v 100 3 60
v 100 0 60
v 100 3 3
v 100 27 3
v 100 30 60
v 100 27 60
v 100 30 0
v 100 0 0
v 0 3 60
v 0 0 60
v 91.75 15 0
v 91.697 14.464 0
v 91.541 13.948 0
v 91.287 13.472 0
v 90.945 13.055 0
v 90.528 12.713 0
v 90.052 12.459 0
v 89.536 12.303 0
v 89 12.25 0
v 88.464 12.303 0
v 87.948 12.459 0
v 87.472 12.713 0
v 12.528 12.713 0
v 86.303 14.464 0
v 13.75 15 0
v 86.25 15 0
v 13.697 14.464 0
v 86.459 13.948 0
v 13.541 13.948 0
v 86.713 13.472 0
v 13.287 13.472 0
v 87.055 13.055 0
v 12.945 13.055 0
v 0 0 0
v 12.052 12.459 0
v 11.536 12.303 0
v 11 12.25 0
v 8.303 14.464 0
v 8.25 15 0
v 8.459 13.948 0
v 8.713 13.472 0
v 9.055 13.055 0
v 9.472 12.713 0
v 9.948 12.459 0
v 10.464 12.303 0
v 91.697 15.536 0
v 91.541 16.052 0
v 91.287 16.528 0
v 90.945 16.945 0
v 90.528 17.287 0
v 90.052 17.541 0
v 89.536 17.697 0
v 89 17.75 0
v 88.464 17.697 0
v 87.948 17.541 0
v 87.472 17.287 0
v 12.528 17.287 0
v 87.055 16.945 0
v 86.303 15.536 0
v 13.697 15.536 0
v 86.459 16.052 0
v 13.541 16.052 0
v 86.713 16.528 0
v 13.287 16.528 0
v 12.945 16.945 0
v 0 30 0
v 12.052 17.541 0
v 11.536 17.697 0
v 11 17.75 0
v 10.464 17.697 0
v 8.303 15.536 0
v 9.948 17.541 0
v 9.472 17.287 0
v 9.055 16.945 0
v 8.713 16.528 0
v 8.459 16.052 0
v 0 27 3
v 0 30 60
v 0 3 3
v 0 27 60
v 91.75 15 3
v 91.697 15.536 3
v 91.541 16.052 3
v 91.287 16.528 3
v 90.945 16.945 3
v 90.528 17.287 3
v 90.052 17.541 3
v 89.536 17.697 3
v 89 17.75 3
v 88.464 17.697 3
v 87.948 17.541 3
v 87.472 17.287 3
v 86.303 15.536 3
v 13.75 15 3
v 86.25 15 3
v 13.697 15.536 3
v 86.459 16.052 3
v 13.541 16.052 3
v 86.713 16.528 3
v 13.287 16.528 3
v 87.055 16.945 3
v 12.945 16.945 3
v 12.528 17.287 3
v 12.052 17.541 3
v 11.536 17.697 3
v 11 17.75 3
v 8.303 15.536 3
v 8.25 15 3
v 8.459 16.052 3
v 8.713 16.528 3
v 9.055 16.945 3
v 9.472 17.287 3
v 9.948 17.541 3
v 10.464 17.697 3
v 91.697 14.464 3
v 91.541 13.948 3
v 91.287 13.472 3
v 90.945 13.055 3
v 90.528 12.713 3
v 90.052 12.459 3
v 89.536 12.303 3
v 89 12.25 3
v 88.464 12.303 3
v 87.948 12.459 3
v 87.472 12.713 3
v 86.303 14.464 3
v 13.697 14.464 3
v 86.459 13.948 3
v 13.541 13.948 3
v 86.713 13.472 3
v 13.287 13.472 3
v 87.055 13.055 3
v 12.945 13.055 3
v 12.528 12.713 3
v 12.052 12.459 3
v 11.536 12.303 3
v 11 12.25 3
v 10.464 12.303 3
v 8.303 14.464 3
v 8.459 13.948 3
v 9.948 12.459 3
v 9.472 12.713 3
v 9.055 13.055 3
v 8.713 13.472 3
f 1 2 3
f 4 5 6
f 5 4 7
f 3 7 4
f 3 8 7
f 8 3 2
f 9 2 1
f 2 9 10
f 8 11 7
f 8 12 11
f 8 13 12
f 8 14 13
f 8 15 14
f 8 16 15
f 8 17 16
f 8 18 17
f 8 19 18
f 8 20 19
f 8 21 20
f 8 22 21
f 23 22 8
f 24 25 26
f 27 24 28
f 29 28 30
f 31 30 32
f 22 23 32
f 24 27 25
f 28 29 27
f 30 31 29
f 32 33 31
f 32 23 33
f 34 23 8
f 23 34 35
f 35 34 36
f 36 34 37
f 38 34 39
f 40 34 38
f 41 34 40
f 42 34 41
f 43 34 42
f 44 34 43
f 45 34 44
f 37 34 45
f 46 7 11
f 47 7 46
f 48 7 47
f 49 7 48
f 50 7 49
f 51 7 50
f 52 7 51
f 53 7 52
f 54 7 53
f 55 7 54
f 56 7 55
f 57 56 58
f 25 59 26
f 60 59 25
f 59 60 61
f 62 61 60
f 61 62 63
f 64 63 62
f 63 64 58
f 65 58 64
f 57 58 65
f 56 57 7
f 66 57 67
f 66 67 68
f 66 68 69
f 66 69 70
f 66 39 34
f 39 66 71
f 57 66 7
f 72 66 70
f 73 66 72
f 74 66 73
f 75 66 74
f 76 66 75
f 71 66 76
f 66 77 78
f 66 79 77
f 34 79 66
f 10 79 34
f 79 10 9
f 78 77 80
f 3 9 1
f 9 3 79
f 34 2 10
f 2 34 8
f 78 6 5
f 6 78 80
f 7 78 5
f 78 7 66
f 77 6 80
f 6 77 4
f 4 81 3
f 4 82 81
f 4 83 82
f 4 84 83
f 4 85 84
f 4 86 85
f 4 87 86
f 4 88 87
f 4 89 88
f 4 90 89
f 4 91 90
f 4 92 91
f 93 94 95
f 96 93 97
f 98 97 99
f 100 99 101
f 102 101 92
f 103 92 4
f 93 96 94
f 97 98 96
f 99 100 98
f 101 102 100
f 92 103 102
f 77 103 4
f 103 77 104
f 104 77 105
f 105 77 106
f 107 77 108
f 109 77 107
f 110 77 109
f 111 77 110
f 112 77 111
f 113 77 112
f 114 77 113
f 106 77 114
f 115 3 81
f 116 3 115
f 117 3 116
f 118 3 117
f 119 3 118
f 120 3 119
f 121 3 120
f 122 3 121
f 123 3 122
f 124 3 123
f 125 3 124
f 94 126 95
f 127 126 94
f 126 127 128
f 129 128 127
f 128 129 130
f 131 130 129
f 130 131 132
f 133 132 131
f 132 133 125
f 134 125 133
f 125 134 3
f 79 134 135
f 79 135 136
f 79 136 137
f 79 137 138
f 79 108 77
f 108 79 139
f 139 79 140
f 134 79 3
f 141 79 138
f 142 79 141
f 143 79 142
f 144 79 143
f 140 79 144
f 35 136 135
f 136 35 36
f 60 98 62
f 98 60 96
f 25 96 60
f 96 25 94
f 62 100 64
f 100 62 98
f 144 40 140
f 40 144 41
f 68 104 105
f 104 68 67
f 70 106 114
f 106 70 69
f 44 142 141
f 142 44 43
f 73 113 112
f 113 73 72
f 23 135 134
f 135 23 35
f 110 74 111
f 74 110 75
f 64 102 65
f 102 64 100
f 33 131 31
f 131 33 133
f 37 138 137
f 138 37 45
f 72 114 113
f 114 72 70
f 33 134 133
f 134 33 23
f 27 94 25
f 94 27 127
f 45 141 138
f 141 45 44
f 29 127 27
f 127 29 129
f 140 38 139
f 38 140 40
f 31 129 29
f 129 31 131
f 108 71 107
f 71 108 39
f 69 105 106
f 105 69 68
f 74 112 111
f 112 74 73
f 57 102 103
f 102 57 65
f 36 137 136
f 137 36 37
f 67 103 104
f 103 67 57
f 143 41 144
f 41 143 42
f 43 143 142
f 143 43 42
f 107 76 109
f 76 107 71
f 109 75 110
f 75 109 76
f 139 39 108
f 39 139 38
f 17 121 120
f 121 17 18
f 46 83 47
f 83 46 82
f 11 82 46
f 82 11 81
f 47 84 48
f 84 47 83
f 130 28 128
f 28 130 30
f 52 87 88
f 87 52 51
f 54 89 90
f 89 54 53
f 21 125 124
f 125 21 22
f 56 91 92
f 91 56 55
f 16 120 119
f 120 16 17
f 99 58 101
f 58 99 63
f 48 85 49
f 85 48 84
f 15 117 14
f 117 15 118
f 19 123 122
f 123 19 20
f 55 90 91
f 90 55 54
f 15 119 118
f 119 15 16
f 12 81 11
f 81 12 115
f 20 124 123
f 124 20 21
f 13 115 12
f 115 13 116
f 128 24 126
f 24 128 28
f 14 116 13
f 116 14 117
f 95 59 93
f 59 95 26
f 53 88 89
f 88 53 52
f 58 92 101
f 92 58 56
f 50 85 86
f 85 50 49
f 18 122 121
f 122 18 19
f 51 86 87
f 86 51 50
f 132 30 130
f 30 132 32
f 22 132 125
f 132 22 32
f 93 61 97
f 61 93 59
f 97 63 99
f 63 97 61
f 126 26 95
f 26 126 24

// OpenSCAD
$fn = 32;

// ----------------------------------------------------------------------
// U-bracket: 100 x 30 x 60 mm
// ----------------------------------------------------------------------

// --- parameters (mm) ---
length = 100;             // outer length, X
width = 30;               // outer width, Y
height = 60;              // upright height, Z
thick = 3;                // wall thickness
hole_d = 5.5;             // clearance for M5

module hole_z(px, py) {
  translate([px, py, -2.5]) cylinder(h = thick + 5, d = hole_d);
}
module hole_y_pz(pz) {
  /* through both uprights along Y */
  translate([0, -2.5, pz]) rotate([-90, 0, 0]) cylinder(h = width + 5, d = hole_d);
}

module base() {
  cube([length, width, thick]);
}

module uprights() {
  cube([length, thick, height]);
  translate([0, width - thick, 0]) cube([length, thick, height]);
}

difference() {
  union() {
    base();
    uprights();
  }
  hole_z(11, 15);
  hole_z(89, 15);
}
